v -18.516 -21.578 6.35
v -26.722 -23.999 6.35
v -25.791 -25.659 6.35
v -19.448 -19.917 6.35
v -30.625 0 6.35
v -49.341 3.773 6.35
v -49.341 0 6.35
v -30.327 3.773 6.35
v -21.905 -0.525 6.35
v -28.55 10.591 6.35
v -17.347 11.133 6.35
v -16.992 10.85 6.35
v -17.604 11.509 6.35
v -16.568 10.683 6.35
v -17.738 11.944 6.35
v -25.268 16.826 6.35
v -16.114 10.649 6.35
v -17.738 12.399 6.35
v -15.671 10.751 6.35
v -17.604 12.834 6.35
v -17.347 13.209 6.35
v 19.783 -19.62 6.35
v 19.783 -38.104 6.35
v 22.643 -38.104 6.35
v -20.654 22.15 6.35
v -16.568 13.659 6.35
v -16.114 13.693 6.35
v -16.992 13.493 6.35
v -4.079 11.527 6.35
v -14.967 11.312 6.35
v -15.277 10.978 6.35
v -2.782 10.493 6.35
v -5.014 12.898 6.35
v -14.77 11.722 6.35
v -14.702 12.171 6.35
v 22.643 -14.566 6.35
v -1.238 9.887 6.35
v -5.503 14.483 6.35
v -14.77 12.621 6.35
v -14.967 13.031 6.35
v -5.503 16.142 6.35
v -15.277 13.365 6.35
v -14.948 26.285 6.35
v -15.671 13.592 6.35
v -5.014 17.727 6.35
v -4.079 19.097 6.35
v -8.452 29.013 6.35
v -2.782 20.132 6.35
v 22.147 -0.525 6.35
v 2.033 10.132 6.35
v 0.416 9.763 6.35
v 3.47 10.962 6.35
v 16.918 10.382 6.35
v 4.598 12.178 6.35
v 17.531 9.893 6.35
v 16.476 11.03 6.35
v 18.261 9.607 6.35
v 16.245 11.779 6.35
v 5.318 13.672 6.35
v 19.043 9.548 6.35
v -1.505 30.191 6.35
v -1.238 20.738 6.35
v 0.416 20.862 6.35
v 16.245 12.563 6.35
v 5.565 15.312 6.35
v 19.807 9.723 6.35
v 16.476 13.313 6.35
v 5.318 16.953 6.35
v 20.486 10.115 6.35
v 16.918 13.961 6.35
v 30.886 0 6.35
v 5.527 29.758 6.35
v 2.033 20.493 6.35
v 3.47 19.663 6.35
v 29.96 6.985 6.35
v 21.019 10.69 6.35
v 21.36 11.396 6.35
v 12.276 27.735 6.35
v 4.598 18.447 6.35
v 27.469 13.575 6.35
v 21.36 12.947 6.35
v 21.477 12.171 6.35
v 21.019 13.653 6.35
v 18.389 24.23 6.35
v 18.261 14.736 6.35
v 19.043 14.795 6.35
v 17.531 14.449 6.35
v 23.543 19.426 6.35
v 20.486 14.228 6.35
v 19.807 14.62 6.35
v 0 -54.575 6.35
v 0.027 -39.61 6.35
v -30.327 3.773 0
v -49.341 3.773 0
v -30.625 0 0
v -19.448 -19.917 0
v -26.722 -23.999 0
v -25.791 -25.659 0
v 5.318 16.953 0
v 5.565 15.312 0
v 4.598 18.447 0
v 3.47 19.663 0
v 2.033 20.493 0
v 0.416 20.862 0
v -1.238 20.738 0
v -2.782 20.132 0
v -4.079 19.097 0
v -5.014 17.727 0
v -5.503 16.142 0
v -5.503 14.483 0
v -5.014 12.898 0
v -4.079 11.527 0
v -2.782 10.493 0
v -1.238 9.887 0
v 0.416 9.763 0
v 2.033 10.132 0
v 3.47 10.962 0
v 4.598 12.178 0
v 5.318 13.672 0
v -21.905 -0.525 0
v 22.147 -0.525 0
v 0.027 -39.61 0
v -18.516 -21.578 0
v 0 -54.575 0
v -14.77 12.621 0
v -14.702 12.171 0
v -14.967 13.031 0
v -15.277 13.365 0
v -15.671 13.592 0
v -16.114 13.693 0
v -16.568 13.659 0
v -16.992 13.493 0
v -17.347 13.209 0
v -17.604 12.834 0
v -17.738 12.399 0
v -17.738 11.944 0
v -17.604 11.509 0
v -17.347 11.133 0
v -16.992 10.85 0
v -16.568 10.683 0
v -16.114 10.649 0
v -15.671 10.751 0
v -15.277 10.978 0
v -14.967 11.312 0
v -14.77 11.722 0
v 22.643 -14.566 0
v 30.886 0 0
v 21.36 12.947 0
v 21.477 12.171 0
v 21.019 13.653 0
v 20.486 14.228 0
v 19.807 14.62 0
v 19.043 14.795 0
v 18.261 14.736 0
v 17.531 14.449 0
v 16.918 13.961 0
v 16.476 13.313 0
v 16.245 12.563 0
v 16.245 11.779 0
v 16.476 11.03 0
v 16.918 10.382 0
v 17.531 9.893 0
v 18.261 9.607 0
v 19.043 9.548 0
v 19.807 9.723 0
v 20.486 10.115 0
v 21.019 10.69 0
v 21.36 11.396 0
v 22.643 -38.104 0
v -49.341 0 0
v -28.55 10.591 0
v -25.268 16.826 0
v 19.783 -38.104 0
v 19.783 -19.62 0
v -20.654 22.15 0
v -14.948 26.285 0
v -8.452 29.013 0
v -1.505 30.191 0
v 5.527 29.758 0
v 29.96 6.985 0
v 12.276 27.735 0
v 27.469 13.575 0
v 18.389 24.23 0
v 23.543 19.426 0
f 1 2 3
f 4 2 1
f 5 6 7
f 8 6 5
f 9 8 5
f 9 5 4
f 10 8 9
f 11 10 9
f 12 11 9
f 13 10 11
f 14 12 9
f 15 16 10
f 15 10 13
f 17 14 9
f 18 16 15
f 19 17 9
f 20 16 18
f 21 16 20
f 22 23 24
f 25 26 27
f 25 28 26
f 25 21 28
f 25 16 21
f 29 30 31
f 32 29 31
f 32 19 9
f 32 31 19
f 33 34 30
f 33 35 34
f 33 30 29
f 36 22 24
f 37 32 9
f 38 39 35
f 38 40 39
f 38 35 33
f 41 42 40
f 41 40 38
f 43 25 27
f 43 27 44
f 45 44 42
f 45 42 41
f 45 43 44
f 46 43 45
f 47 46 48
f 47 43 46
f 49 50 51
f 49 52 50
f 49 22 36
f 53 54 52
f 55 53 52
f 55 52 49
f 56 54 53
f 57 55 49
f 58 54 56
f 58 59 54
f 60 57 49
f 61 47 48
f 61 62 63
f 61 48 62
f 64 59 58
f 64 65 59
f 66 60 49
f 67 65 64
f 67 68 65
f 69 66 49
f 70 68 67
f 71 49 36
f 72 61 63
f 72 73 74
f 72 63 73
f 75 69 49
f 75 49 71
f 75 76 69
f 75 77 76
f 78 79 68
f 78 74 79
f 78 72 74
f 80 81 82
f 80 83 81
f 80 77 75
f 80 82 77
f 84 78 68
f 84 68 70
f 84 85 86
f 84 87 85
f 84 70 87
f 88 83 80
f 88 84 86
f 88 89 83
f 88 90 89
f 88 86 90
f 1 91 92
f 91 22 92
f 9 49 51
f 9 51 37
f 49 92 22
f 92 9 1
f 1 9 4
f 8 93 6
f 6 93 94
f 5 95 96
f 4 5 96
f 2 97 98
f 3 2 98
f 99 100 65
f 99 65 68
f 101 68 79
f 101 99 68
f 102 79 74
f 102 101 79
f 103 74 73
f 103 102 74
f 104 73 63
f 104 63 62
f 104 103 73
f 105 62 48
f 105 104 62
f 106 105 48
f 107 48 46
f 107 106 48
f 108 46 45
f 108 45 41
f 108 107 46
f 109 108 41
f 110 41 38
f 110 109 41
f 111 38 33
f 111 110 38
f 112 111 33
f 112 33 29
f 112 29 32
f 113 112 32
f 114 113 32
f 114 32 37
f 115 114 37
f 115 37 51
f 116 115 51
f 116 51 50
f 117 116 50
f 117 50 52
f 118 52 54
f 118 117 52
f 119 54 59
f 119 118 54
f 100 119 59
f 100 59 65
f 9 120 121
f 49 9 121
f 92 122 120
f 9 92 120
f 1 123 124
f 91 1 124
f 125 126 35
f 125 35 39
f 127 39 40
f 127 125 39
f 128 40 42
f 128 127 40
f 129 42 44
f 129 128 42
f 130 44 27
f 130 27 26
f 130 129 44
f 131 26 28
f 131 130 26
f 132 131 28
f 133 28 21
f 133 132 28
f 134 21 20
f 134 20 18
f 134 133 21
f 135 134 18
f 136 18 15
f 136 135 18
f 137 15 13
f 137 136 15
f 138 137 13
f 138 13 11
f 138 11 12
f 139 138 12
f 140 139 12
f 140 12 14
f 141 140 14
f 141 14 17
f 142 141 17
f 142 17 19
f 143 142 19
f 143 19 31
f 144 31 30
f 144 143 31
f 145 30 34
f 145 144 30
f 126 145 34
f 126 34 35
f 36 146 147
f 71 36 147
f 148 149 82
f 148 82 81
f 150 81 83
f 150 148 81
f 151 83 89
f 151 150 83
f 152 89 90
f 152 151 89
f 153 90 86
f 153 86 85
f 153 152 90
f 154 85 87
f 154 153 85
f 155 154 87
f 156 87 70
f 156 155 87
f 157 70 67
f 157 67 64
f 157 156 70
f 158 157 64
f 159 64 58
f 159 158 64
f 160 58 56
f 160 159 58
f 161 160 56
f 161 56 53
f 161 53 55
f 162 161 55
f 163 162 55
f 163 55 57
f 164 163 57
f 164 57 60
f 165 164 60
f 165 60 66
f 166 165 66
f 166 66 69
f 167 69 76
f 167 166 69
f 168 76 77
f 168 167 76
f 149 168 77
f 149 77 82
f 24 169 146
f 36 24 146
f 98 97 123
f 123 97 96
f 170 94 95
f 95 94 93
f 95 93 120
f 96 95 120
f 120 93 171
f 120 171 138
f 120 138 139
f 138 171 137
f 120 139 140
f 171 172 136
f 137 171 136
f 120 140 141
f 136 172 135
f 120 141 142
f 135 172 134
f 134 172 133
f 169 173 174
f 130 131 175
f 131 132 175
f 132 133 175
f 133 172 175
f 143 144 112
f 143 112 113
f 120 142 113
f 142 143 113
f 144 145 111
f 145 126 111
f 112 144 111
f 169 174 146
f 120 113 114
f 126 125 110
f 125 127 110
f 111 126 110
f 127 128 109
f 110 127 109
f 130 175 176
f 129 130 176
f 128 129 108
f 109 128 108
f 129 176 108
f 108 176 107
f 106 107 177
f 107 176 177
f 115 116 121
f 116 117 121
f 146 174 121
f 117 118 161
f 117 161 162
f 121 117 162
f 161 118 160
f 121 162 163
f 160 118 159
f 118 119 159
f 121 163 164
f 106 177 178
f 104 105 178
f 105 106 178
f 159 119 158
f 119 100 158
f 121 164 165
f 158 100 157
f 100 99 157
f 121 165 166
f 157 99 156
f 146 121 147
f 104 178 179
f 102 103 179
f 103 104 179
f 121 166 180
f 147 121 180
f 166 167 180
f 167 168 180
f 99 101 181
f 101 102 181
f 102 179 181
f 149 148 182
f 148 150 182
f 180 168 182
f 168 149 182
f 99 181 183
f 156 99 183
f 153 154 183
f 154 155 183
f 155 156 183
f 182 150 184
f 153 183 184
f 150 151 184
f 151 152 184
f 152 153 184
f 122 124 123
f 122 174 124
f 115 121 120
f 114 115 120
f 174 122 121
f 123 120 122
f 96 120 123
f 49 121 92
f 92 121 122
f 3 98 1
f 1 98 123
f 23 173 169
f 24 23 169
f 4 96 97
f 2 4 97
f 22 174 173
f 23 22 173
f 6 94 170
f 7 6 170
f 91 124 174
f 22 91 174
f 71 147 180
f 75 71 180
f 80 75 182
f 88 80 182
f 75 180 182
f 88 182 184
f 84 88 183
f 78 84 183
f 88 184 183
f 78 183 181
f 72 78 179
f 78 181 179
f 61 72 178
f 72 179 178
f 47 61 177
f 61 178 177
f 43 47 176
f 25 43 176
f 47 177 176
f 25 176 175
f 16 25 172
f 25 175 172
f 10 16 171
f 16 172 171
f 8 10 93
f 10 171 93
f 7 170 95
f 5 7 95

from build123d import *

# Parameters (mm, degrees)
F0_R     = 1.5262492047
F0_R_2   = 5.564877875
F0_R_3   = 2.6305534458
F1_DEPTH = 6.35


# Not quite as in the source:
# - a feature names something its author has since deleted; it is built from what else it names


with BuildPart() as f1:
    # F0 (on Top) → F1 (new body)
    with BuildSketch(Plane.XY):
        with BuildLine():
            Line((-18.5164521814, -21.5775697793), (0, -54.5748323202))
            Line((0, -54.5748323202), (19.7828651091, -19.6195188363))
            Line((19.7828651091, -19.6195188363), (22.6427465677, -14.5662541873))
            Line((22.6427465677, -14.5662541873), (30.8864787221, 0))
            ThreePointArc((30.8864787221, 0), (2.0232479541, 30.1763499671), (-30.3273923907, 3.7730498517))
            ThreePointArc((-30.3273923907, 3.7730498517), (-30.5341463656, 1.8911023526), (-30.6247305125, 0))
            Line((-30.6247305125, 0), (-19.4482157174, -19.9171196174))
            Line((-19.4482157174, -19.9171196174), (-18.5164521814, -21.5775697793))
        make_face()
        Polygon((22.1472843044, -0.5254783843), (0.0272358089, -39.6104756875), (-21.9053558016, -0.5254783843), (0.1308741048, -0.5254783843), align=None, mode=Mode.SUBTRACT)
        with Locations((-16.2284877151, 12.1713718399)):
            Circle(F0_R, mode=Mode.SUBTRACT)
        with Locations((0, 15.3123699129)):
            Circle(F0_R_2, mode=Mode.SUBTRACT)
        with Locations((18.8459847122, 12.1713718399)):
            Circle(F0_R_3, mode=Mode.SUBTRACT)
        Polygon((22.6427465677, -14.5662541873), (19.7828651091, -19.6195188363), (19.7828651091, -38.1040237844), (22.6427465677, -38.1040237844), align=None)
        Polygon((-25.7906284703, -25.6594822484), (-18.5164521814, -21.5775697793), (-19.4482157174, -19.9171196174), (-26.7223920062, -23.9990320865), align=None)
        with BuildLine():
            Line((-49.3409076612, 0), (-30.6247305125, 0))
            ThreePointArc((-30.6247305125, 0), (-30.5341463656, 1.8911023526), (-30.3273923907, 3.7730498517))
            Line((-30.3273923907, 3.7730498517), (-49.3409076612, 3.7730498517))
            Line((-49.3409076612, 3.7730498517), (-49.3409076612, 0))
        make_face()
    extrude(amount=F1_DEPTH)


solid = f1.part
